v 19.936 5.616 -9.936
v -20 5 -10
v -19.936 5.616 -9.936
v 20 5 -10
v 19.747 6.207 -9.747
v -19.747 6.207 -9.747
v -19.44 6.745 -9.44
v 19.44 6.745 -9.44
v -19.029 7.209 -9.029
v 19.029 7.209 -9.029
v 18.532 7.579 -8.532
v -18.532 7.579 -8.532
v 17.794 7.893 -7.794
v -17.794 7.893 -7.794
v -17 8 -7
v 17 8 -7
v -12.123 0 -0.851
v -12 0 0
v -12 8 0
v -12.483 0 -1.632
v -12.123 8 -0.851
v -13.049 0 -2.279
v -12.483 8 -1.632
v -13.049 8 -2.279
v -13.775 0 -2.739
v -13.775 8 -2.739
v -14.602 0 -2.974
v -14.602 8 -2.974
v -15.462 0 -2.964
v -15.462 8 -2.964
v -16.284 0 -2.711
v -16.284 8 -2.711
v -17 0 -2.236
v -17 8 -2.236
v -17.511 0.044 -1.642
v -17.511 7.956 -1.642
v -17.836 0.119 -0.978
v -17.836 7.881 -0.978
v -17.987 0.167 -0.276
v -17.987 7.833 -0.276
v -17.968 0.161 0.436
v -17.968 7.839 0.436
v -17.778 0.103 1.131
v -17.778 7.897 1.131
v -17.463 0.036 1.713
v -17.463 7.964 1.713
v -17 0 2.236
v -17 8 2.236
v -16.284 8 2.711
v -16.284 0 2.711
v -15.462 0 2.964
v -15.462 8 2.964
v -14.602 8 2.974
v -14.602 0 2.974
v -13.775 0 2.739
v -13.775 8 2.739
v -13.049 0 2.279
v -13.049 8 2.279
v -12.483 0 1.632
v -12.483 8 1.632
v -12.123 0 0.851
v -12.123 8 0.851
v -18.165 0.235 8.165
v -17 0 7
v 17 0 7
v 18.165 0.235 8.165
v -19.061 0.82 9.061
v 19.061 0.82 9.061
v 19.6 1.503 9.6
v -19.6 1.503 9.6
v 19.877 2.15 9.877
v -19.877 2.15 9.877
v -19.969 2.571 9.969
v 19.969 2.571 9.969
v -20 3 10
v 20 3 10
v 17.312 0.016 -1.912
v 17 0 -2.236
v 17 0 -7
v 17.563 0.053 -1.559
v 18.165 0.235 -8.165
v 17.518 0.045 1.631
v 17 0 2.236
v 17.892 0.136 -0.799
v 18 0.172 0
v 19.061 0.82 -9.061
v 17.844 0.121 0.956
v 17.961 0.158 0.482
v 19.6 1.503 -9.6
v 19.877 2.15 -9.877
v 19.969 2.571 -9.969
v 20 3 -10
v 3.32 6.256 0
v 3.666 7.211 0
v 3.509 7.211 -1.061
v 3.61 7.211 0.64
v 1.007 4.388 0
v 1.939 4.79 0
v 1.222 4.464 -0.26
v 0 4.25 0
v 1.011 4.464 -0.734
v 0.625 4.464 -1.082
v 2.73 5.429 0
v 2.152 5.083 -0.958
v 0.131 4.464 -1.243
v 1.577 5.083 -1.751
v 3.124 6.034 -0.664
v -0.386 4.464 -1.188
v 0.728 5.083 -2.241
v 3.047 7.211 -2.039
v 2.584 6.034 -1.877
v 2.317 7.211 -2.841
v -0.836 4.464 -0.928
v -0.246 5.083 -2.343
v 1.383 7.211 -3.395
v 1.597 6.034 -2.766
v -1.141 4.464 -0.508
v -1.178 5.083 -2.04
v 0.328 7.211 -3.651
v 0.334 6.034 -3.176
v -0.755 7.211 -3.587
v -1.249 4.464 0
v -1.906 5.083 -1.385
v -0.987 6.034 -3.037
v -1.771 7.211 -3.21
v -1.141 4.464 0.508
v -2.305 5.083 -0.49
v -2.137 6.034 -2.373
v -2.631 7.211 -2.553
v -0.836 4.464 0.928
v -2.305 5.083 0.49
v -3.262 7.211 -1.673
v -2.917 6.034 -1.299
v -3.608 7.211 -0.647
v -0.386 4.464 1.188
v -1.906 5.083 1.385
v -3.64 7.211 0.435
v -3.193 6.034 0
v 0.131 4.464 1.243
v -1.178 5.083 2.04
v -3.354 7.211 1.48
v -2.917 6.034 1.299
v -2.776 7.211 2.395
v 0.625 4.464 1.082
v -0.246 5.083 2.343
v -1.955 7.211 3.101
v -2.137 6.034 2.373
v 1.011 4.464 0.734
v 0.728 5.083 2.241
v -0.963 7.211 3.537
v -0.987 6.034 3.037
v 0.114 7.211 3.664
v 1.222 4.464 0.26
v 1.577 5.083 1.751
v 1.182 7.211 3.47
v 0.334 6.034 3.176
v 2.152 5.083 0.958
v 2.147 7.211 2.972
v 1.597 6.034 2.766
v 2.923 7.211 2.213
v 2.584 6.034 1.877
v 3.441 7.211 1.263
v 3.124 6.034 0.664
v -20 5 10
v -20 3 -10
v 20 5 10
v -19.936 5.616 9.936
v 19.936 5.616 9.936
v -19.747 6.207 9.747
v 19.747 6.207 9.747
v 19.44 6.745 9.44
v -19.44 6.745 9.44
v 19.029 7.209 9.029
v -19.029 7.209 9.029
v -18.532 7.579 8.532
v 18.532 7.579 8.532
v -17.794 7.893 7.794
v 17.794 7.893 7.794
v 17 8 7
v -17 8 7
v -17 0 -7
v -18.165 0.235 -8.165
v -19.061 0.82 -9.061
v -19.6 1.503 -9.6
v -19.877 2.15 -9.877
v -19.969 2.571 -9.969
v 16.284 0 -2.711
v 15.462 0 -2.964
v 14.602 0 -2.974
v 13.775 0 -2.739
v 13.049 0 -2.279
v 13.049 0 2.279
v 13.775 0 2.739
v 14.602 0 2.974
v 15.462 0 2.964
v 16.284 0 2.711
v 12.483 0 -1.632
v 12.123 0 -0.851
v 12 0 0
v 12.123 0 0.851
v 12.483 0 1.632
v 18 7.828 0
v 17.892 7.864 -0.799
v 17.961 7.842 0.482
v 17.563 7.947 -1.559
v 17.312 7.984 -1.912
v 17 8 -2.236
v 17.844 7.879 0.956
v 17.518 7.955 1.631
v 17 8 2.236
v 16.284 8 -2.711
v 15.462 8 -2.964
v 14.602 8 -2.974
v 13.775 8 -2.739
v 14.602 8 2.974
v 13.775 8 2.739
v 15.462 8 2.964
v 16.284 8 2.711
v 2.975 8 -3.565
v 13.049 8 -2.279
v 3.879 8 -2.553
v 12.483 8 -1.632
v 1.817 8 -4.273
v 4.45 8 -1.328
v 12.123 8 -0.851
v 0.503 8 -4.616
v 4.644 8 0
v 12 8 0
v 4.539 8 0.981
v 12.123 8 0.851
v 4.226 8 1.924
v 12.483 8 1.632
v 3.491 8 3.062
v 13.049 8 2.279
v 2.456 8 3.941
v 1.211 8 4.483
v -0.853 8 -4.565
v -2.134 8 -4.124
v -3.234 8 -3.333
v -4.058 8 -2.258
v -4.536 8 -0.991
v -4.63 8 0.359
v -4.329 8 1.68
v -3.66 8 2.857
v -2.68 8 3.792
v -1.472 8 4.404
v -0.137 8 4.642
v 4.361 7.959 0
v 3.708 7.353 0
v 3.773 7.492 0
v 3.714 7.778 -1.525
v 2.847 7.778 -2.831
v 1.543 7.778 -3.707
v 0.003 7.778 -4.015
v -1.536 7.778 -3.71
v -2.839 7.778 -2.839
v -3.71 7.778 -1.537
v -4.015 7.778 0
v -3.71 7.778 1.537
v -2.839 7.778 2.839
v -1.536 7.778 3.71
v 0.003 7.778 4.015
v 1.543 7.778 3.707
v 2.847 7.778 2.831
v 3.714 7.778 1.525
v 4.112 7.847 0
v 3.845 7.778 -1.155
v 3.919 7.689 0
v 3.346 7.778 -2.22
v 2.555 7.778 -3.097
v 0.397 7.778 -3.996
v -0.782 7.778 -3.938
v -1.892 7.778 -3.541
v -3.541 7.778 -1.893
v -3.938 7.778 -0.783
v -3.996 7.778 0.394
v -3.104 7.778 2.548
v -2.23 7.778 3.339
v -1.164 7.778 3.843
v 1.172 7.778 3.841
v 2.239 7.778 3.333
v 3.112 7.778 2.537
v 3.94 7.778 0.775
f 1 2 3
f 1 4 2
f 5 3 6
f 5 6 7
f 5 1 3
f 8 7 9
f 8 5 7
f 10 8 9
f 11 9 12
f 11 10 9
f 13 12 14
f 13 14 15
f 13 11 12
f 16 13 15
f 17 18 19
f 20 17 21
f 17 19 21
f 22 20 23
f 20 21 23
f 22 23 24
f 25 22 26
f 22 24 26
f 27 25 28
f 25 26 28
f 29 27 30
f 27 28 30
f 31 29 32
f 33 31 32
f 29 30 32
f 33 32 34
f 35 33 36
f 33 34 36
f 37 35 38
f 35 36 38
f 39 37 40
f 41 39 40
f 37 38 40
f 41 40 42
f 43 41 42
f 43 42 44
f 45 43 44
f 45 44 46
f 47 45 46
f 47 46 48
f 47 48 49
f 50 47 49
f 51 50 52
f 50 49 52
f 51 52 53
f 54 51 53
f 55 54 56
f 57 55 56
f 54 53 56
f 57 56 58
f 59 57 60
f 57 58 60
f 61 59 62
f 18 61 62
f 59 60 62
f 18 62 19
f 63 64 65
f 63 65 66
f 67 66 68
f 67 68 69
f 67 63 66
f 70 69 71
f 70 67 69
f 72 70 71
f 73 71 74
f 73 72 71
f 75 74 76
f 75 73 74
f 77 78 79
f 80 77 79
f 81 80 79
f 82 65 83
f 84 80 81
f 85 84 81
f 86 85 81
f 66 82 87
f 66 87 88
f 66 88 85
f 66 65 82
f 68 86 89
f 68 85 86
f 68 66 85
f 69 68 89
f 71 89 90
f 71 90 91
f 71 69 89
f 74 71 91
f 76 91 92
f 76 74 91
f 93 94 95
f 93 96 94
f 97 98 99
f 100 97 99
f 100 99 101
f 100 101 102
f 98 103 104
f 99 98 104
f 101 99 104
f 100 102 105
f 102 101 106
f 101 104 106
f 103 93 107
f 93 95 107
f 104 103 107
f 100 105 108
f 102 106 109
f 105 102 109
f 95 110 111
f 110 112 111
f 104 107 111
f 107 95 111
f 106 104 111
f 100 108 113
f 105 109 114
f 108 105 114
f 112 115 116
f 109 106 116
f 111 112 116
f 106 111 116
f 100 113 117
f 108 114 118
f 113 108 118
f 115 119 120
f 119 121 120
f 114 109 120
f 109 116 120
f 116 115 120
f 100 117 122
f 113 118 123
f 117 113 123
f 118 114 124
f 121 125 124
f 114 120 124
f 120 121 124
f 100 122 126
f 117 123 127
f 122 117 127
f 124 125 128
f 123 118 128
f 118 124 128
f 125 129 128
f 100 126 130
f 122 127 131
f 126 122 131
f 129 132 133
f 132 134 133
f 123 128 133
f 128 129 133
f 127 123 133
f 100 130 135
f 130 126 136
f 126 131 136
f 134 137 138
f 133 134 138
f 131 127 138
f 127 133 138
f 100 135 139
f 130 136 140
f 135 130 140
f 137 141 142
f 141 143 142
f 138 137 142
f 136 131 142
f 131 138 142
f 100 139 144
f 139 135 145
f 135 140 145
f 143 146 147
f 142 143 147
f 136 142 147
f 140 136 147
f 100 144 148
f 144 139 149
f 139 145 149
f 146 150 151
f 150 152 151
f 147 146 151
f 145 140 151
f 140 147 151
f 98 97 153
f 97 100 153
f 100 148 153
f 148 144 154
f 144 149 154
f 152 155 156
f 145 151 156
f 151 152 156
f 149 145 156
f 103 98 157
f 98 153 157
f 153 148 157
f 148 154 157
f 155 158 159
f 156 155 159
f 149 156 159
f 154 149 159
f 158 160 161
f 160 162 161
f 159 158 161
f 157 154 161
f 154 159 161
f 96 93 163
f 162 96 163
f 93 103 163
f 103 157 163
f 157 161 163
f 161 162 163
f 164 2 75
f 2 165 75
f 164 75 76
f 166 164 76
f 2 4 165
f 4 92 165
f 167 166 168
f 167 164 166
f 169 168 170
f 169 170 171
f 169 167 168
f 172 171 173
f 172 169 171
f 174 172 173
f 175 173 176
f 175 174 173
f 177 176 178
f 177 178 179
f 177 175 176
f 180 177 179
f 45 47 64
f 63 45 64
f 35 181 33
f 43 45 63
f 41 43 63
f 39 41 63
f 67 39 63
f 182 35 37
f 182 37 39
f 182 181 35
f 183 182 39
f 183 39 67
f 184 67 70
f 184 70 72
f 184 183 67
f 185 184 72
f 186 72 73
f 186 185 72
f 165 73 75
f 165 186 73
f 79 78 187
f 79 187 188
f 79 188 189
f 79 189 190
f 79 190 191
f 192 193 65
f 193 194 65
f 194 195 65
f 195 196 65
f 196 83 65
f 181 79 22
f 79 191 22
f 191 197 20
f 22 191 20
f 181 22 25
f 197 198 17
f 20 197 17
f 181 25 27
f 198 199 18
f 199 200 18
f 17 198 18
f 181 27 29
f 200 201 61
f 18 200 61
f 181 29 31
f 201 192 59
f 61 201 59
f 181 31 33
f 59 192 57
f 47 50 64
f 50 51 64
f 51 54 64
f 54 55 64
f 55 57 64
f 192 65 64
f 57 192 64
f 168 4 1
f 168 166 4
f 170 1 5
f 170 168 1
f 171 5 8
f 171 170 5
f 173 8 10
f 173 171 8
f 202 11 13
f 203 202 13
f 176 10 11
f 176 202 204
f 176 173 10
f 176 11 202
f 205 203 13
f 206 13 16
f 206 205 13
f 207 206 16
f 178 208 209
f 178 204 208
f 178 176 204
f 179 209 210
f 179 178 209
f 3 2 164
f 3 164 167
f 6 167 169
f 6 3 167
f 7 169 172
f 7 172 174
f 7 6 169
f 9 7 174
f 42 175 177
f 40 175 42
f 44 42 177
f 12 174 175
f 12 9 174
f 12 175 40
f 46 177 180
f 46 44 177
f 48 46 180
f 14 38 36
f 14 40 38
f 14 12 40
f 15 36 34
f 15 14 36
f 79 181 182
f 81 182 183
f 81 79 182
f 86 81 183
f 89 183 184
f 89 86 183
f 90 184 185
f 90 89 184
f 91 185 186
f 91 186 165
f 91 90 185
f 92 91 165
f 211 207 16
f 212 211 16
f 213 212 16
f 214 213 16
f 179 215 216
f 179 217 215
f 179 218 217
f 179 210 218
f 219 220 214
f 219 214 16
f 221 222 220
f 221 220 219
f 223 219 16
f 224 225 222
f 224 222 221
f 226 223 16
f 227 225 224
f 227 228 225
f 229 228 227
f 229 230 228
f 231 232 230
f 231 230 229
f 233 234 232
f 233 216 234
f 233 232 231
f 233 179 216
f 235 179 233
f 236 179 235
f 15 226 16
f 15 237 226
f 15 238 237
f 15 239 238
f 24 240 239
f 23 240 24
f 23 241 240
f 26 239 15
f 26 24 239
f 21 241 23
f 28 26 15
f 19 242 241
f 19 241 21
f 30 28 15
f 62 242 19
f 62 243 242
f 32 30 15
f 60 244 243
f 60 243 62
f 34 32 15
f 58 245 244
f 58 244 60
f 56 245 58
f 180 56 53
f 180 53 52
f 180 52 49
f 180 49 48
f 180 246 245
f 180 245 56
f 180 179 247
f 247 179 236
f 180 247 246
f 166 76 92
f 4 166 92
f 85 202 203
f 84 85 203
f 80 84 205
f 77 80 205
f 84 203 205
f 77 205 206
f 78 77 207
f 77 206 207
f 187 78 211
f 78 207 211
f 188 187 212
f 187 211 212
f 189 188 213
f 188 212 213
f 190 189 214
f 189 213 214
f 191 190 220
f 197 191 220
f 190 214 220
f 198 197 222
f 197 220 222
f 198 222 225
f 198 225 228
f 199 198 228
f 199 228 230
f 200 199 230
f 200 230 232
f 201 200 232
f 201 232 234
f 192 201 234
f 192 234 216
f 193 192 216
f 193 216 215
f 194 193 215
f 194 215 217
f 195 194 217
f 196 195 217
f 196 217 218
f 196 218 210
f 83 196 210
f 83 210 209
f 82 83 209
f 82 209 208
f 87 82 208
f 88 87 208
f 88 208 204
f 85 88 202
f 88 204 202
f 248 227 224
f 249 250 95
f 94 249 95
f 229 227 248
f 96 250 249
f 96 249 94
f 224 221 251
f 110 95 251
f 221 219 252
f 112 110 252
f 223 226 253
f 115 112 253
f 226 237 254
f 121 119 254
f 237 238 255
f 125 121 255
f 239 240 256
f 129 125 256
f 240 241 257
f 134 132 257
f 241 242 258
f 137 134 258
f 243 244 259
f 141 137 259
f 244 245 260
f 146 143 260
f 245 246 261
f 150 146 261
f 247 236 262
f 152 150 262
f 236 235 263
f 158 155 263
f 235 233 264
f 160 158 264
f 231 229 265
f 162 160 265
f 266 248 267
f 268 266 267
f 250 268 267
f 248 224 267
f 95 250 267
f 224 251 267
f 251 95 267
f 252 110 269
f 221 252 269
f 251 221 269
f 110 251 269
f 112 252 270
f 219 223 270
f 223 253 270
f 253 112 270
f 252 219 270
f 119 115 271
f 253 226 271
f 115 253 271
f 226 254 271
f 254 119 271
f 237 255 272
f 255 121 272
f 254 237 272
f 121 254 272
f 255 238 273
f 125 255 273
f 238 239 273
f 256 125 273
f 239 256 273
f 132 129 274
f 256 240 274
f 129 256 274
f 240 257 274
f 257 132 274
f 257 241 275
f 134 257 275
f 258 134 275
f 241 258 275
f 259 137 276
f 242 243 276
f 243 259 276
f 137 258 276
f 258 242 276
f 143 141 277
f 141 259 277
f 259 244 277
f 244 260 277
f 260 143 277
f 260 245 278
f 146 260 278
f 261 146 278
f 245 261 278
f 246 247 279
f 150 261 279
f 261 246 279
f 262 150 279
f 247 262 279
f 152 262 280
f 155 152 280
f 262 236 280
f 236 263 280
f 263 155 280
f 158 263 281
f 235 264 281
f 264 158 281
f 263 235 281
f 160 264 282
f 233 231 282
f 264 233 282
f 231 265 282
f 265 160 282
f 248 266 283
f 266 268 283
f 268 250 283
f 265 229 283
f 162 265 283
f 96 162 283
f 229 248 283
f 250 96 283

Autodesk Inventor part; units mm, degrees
ref_plane "YZ Plane" through (0, 0, 0) normal (1, 0, 0) x (0, 1, 0)
ref_plane "XZ Plane" through (0, 0, 0) normal (0, 1, 0) x (-1, 0, 0)
sketch "Sketch1" plane through (0, 0, 0) normal (0, 1, 0) x (-1, 0, 0)
  line L0 (-20, -10) -> (20, -10)
  line L1 (20, -10) -> (20, 10)
  line L2 (20, 10) -> (-20, 10)
  line L3 (-20, 10) -> (-20, -10)
  line L4 (-20, -10) -> (20, 10) construction
  line L5 (20, -10) -> (-20, 10) construction
  point P0 (0, 0)
  dimension "d0" = 40
  dimension "d1" = 20
extrude "Extrusion1" add sketch "Sketch1" along normal blind 8
ref_plane "Work Plane1" through (-20, 0, 0) normal (0, 0, 1) x (1, 0, 0)
sketch "Sketch3" plane through (-20, 0, 0) normal (0, 0, 1) x (1, 0, 0)
  line L0 (0, 8) -> (40, 8) projected
  line L1 (40, 8) -> (30, 8)
  circle A0 centre (20, 8) radius 3.75
  line L2 (0, 0) -> (40, 0) projected
  line L3 (20, 8) -> (20, 10)
  line L4 (20, 10) -> (16.8279, 10)
  line L5 (20, 10) -> (23.1721, 10)
  line L6 (20, 8) -> (20, 2.75)
  point P0 (20, 0)
  point P1 (20, 4.25)
  dimension "d12" = 10
  dimension "d13" = 7.5
  dimension "d14" = 8
  dimension "d15" = 20
  dimension "d16" = 2
  dimension "d17" = 5.25
revolve "Revolution3" cut sketch "Sketch3" angle 360 about axis through (0, 8, 0) along (0, 1, 0) picked at (21.3217, 5.8965) contours L3 L5 A0 L0 | L0 A0 L6
fillet "Fillet2" radius 1 1 edges at (-3.75, 8, 0)
pattern_of_one "Rectangular Pattern2"
sketch "Sketch4" plane through (0, 8, 0) normal (0, 1, 0) x (1, 0, 0)
  line L0 (-20, 10) -> (-20, -10) projected
  line L1 (-20, 0) -> (-15, 0)
  line L2 (20, -10) -> (20, 10) projected
  line L3 (20, 0) -> (15, 0)
  circle A0 centre (-15, 0) radius 3
  circle A1 centre (15, 0) radius 3
  point P0 (0, 0)
  dimension "d33" = 5
  dimension "d34" = 5
  dimension "d35" = 6
  dimension "d36" = 6
extrude "Extrusion2" cut sketch "Sketch4" against normal blind 10
fillet "Fillet3" radius 3 4 edges at (0, 8, 10) (0, 8, -10) (-20, 8, 0) (20, 8, 0)
fillet "Fillet4" radius 3 4 edges at (0, 0, 10) (-20, 0, 0) (20, 0, 0) (0, 0, -10)
properties part number "TestBearingPad"
